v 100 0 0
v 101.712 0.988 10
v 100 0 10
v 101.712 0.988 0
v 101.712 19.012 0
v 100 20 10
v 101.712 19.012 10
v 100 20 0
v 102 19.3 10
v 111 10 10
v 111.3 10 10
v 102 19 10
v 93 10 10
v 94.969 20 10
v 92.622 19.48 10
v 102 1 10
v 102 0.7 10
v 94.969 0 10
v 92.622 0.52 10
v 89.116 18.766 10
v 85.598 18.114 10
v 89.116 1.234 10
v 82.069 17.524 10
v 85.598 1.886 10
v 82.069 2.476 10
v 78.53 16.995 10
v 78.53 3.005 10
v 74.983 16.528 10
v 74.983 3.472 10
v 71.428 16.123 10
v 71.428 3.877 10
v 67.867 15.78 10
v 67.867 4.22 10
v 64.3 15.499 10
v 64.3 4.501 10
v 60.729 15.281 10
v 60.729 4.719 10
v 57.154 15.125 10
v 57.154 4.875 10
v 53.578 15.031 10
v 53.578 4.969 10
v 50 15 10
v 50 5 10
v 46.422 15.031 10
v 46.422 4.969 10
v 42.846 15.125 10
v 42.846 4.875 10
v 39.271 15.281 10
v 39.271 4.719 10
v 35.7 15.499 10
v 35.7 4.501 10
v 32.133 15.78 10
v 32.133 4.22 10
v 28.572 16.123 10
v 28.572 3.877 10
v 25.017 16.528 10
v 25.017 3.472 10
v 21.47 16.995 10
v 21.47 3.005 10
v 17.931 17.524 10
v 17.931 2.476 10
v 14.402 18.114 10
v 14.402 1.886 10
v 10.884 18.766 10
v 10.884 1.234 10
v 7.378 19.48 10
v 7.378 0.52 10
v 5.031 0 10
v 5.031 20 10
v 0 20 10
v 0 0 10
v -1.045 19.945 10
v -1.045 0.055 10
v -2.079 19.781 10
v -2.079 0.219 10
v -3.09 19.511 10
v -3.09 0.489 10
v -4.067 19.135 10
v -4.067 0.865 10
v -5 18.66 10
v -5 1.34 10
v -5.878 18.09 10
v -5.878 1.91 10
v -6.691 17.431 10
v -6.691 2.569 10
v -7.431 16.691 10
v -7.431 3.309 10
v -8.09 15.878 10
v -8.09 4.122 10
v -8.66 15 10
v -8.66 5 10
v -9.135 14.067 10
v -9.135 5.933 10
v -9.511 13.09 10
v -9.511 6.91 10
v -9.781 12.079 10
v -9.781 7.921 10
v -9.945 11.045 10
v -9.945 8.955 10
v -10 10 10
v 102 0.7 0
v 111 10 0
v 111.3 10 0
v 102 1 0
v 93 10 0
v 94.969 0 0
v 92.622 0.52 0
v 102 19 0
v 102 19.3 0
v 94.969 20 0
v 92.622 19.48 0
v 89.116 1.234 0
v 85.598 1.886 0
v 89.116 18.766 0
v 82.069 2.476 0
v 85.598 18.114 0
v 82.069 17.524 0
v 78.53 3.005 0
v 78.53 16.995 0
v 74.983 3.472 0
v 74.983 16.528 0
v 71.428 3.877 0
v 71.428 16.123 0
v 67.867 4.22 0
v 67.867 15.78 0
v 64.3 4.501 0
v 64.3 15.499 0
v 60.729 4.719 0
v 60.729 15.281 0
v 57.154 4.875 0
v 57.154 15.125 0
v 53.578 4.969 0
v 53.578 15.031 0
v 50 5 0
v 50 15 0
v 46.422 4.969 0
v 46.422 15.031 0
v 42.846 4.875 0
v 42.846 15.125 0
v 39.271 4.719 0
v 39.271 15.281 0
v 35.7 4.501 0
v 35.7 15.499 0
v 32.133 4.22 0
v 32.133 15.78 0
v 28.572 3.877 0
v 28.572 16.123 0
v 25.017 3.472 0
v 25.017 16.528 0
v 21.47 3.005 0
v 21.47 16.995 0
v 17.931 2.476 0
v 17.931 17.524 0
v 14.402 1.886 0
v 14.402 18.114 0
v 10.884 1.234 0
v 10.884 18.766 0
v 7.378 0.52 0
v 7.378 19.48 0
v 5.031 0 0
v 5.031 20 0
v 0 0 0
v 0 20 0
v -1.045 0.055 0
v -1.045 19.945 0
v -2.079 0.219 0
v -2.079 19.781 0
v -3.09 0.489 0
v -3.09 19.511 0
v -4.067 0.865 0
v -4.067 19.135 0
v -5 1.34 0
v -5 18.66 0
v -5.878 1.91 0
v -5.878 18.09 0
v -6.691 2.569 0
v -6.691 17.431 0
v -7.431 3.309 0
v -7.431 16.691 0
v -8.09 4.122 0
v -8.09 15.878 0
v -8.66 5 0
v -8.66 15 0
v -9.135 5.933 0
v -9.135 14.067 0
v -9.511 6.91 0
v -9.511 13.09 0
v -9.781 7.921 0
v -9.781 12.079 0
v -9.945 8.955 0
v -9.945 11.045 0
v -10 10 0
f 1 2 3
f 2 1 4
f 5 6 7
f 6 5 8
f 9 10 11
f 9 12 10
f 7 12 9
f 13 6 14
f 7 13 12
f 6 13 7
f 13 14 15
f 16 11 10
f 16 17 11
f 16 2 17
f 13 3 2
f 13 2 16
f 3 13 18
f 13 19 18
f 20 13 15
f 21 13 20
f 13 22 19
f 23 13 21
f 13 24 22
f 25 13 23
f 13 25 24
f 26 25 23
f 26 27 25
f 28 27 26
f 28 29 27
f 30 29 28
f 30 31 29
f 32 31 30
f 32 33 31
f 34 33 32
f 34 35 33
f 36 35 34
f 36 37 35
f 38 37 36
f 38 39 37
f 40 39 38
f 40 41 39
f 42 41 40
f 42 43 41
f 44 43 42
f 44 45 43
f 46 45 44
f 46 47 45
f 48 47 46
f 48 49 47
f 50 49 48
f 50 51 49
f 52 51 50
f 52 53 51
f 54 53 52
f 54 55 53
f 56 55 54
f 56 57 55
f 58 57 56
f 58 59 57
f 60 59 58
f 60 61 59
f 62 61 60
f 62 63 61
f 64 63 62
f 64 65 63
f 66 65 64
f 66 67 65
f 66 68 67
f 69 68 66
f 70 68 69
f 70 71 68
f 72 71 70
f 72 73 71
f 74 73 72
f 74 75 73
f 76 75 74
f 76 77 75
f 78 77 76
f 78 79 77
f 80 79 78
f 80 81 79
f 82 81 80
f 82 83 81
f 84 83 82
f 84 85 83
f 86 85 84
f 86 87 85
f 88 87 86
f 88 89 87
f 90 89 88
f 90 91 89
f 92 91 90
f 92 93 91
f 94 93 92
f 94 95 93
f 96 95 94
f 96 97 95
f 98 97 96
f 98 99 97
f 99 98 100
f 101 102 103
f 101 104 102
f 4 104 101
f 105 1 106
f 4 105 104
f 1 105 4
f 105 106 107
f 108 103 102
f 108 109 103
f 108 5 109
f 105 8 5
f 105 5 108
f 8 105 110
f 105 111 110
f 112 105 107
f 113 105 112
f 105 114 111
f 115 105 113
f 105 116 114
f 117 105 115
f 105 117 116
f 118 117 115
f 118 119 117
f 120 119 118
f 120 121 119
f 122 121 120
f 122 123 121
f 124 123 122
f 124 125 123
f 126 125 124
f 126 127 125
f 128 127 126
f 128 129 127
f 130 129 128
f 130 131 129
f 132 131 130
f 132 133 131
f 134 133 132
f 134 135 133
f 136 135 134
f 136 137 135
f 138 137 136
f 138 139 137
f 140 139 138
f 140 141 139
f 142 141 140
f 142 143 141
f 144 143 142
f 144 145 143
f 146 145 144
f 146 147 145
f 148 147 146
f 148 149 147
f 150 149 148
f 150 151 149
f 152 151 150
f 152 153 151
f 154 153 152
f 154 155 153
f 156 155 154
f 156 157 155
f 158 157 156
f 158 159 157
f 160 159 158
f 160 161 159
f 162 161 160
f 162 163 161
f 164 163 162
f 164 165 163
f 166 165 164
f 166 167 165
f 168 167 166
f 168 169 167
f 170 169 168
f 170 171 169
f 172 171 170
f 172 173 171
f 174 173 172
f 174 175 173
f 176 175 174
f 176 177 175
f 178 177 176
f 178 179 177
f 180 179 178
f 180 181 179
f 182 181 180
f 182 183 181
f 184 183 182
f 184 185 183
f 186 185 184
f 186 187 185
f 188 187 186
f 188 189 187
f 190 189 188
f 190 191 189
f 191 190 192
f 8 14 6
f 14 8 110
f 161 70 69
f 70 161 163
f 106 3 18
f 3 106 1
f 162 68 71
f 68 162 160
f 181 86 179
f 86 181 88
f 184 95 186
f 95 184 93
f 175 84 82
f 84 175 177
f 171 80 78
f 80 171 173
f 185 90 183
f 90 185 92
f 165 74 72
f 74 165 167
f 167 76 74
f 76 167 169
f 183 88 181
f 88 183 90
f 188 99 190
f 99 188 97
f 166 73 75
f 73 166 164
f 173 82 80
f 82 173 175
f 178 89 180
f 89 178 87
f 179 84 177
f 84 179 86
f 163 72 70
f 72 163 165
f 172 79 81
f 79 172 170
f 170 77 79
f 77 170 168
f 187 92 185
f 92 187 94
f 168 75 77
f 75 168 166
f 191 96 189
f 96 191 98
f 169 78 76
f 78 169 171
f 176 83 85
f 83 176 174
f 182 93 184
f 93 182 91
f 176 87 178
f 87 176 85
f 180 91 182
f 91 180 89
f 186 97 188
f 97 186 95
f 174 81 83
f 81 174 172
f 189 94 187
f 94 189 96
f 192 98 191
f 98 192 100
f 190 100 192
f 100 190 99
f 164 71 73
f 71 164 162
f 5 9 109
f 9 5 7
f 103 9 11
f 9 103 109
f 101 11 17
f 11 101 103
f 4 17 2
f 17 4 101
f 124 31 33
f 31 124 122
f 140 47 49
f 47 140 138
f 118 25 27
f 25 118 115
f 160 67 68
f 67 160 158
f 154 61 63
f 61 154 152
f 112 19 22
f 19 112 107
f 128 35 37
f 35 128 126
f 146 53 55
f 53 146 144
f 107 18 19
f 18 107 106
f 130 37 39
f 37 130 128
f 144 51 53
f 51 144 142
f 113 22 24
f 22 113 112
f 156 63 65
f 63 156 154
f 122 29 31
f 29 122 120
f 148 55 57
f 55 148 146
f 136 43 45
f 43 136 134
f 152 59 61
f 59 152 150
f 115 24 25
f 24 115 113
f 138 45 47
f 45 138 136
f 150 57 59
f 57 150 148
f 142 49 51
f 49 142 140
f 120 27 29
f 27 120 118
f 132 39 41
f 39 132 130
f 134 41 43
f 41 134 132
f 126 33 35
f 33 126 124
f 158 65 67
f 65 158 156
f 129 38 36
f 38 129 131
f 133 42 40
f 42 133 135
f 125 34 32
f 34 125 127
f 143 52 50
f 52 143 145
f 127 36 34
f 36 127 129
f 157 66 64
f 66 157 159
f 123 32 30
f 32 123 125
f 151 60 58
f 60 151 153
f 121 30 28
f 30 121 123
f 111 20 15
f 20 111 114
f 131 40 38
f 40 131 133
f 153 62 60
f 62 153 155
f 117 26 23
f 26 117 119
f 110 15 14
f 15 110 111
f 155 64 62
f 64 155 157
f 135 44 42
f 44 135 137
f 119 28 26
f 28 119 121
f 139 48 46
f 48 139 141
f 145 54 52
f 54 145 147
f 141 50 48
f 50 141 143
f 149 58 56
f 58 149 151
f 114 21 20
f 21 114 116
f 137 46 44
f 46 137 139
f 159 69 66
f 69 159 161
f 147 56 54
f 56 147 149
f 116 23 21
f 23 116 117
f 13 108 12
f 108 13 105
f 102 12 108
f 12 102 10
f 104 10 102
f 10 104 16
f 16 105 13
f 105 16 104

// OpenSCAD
difference() {
	union() {
		cube([100, 20, 10]);
		translate([0, 10, 0])
			cylinder(r=10, h=10, $fn=60);
		translate([100, 10, 0])
			difference() {
				rotate([0, 0, 360/12])
					cylinder(r=10, h=10, $fn=6);
				translate([3, -10, 0])
					cube([20, 20, 10]);
			}
		translate([102, 10, 0])
			cylinder(r=9.3, h=10, $fn=4);
	}
	translate([50, -200, 0])
		cylinder(r=205, h=10, $fn=360);
	translate([50, 220, 0])
		cylinder(r=205, h=10, $fn=360);
	translate([102, 10, 0])
		cylinder(r=9, h=10, $fn=4);
}
